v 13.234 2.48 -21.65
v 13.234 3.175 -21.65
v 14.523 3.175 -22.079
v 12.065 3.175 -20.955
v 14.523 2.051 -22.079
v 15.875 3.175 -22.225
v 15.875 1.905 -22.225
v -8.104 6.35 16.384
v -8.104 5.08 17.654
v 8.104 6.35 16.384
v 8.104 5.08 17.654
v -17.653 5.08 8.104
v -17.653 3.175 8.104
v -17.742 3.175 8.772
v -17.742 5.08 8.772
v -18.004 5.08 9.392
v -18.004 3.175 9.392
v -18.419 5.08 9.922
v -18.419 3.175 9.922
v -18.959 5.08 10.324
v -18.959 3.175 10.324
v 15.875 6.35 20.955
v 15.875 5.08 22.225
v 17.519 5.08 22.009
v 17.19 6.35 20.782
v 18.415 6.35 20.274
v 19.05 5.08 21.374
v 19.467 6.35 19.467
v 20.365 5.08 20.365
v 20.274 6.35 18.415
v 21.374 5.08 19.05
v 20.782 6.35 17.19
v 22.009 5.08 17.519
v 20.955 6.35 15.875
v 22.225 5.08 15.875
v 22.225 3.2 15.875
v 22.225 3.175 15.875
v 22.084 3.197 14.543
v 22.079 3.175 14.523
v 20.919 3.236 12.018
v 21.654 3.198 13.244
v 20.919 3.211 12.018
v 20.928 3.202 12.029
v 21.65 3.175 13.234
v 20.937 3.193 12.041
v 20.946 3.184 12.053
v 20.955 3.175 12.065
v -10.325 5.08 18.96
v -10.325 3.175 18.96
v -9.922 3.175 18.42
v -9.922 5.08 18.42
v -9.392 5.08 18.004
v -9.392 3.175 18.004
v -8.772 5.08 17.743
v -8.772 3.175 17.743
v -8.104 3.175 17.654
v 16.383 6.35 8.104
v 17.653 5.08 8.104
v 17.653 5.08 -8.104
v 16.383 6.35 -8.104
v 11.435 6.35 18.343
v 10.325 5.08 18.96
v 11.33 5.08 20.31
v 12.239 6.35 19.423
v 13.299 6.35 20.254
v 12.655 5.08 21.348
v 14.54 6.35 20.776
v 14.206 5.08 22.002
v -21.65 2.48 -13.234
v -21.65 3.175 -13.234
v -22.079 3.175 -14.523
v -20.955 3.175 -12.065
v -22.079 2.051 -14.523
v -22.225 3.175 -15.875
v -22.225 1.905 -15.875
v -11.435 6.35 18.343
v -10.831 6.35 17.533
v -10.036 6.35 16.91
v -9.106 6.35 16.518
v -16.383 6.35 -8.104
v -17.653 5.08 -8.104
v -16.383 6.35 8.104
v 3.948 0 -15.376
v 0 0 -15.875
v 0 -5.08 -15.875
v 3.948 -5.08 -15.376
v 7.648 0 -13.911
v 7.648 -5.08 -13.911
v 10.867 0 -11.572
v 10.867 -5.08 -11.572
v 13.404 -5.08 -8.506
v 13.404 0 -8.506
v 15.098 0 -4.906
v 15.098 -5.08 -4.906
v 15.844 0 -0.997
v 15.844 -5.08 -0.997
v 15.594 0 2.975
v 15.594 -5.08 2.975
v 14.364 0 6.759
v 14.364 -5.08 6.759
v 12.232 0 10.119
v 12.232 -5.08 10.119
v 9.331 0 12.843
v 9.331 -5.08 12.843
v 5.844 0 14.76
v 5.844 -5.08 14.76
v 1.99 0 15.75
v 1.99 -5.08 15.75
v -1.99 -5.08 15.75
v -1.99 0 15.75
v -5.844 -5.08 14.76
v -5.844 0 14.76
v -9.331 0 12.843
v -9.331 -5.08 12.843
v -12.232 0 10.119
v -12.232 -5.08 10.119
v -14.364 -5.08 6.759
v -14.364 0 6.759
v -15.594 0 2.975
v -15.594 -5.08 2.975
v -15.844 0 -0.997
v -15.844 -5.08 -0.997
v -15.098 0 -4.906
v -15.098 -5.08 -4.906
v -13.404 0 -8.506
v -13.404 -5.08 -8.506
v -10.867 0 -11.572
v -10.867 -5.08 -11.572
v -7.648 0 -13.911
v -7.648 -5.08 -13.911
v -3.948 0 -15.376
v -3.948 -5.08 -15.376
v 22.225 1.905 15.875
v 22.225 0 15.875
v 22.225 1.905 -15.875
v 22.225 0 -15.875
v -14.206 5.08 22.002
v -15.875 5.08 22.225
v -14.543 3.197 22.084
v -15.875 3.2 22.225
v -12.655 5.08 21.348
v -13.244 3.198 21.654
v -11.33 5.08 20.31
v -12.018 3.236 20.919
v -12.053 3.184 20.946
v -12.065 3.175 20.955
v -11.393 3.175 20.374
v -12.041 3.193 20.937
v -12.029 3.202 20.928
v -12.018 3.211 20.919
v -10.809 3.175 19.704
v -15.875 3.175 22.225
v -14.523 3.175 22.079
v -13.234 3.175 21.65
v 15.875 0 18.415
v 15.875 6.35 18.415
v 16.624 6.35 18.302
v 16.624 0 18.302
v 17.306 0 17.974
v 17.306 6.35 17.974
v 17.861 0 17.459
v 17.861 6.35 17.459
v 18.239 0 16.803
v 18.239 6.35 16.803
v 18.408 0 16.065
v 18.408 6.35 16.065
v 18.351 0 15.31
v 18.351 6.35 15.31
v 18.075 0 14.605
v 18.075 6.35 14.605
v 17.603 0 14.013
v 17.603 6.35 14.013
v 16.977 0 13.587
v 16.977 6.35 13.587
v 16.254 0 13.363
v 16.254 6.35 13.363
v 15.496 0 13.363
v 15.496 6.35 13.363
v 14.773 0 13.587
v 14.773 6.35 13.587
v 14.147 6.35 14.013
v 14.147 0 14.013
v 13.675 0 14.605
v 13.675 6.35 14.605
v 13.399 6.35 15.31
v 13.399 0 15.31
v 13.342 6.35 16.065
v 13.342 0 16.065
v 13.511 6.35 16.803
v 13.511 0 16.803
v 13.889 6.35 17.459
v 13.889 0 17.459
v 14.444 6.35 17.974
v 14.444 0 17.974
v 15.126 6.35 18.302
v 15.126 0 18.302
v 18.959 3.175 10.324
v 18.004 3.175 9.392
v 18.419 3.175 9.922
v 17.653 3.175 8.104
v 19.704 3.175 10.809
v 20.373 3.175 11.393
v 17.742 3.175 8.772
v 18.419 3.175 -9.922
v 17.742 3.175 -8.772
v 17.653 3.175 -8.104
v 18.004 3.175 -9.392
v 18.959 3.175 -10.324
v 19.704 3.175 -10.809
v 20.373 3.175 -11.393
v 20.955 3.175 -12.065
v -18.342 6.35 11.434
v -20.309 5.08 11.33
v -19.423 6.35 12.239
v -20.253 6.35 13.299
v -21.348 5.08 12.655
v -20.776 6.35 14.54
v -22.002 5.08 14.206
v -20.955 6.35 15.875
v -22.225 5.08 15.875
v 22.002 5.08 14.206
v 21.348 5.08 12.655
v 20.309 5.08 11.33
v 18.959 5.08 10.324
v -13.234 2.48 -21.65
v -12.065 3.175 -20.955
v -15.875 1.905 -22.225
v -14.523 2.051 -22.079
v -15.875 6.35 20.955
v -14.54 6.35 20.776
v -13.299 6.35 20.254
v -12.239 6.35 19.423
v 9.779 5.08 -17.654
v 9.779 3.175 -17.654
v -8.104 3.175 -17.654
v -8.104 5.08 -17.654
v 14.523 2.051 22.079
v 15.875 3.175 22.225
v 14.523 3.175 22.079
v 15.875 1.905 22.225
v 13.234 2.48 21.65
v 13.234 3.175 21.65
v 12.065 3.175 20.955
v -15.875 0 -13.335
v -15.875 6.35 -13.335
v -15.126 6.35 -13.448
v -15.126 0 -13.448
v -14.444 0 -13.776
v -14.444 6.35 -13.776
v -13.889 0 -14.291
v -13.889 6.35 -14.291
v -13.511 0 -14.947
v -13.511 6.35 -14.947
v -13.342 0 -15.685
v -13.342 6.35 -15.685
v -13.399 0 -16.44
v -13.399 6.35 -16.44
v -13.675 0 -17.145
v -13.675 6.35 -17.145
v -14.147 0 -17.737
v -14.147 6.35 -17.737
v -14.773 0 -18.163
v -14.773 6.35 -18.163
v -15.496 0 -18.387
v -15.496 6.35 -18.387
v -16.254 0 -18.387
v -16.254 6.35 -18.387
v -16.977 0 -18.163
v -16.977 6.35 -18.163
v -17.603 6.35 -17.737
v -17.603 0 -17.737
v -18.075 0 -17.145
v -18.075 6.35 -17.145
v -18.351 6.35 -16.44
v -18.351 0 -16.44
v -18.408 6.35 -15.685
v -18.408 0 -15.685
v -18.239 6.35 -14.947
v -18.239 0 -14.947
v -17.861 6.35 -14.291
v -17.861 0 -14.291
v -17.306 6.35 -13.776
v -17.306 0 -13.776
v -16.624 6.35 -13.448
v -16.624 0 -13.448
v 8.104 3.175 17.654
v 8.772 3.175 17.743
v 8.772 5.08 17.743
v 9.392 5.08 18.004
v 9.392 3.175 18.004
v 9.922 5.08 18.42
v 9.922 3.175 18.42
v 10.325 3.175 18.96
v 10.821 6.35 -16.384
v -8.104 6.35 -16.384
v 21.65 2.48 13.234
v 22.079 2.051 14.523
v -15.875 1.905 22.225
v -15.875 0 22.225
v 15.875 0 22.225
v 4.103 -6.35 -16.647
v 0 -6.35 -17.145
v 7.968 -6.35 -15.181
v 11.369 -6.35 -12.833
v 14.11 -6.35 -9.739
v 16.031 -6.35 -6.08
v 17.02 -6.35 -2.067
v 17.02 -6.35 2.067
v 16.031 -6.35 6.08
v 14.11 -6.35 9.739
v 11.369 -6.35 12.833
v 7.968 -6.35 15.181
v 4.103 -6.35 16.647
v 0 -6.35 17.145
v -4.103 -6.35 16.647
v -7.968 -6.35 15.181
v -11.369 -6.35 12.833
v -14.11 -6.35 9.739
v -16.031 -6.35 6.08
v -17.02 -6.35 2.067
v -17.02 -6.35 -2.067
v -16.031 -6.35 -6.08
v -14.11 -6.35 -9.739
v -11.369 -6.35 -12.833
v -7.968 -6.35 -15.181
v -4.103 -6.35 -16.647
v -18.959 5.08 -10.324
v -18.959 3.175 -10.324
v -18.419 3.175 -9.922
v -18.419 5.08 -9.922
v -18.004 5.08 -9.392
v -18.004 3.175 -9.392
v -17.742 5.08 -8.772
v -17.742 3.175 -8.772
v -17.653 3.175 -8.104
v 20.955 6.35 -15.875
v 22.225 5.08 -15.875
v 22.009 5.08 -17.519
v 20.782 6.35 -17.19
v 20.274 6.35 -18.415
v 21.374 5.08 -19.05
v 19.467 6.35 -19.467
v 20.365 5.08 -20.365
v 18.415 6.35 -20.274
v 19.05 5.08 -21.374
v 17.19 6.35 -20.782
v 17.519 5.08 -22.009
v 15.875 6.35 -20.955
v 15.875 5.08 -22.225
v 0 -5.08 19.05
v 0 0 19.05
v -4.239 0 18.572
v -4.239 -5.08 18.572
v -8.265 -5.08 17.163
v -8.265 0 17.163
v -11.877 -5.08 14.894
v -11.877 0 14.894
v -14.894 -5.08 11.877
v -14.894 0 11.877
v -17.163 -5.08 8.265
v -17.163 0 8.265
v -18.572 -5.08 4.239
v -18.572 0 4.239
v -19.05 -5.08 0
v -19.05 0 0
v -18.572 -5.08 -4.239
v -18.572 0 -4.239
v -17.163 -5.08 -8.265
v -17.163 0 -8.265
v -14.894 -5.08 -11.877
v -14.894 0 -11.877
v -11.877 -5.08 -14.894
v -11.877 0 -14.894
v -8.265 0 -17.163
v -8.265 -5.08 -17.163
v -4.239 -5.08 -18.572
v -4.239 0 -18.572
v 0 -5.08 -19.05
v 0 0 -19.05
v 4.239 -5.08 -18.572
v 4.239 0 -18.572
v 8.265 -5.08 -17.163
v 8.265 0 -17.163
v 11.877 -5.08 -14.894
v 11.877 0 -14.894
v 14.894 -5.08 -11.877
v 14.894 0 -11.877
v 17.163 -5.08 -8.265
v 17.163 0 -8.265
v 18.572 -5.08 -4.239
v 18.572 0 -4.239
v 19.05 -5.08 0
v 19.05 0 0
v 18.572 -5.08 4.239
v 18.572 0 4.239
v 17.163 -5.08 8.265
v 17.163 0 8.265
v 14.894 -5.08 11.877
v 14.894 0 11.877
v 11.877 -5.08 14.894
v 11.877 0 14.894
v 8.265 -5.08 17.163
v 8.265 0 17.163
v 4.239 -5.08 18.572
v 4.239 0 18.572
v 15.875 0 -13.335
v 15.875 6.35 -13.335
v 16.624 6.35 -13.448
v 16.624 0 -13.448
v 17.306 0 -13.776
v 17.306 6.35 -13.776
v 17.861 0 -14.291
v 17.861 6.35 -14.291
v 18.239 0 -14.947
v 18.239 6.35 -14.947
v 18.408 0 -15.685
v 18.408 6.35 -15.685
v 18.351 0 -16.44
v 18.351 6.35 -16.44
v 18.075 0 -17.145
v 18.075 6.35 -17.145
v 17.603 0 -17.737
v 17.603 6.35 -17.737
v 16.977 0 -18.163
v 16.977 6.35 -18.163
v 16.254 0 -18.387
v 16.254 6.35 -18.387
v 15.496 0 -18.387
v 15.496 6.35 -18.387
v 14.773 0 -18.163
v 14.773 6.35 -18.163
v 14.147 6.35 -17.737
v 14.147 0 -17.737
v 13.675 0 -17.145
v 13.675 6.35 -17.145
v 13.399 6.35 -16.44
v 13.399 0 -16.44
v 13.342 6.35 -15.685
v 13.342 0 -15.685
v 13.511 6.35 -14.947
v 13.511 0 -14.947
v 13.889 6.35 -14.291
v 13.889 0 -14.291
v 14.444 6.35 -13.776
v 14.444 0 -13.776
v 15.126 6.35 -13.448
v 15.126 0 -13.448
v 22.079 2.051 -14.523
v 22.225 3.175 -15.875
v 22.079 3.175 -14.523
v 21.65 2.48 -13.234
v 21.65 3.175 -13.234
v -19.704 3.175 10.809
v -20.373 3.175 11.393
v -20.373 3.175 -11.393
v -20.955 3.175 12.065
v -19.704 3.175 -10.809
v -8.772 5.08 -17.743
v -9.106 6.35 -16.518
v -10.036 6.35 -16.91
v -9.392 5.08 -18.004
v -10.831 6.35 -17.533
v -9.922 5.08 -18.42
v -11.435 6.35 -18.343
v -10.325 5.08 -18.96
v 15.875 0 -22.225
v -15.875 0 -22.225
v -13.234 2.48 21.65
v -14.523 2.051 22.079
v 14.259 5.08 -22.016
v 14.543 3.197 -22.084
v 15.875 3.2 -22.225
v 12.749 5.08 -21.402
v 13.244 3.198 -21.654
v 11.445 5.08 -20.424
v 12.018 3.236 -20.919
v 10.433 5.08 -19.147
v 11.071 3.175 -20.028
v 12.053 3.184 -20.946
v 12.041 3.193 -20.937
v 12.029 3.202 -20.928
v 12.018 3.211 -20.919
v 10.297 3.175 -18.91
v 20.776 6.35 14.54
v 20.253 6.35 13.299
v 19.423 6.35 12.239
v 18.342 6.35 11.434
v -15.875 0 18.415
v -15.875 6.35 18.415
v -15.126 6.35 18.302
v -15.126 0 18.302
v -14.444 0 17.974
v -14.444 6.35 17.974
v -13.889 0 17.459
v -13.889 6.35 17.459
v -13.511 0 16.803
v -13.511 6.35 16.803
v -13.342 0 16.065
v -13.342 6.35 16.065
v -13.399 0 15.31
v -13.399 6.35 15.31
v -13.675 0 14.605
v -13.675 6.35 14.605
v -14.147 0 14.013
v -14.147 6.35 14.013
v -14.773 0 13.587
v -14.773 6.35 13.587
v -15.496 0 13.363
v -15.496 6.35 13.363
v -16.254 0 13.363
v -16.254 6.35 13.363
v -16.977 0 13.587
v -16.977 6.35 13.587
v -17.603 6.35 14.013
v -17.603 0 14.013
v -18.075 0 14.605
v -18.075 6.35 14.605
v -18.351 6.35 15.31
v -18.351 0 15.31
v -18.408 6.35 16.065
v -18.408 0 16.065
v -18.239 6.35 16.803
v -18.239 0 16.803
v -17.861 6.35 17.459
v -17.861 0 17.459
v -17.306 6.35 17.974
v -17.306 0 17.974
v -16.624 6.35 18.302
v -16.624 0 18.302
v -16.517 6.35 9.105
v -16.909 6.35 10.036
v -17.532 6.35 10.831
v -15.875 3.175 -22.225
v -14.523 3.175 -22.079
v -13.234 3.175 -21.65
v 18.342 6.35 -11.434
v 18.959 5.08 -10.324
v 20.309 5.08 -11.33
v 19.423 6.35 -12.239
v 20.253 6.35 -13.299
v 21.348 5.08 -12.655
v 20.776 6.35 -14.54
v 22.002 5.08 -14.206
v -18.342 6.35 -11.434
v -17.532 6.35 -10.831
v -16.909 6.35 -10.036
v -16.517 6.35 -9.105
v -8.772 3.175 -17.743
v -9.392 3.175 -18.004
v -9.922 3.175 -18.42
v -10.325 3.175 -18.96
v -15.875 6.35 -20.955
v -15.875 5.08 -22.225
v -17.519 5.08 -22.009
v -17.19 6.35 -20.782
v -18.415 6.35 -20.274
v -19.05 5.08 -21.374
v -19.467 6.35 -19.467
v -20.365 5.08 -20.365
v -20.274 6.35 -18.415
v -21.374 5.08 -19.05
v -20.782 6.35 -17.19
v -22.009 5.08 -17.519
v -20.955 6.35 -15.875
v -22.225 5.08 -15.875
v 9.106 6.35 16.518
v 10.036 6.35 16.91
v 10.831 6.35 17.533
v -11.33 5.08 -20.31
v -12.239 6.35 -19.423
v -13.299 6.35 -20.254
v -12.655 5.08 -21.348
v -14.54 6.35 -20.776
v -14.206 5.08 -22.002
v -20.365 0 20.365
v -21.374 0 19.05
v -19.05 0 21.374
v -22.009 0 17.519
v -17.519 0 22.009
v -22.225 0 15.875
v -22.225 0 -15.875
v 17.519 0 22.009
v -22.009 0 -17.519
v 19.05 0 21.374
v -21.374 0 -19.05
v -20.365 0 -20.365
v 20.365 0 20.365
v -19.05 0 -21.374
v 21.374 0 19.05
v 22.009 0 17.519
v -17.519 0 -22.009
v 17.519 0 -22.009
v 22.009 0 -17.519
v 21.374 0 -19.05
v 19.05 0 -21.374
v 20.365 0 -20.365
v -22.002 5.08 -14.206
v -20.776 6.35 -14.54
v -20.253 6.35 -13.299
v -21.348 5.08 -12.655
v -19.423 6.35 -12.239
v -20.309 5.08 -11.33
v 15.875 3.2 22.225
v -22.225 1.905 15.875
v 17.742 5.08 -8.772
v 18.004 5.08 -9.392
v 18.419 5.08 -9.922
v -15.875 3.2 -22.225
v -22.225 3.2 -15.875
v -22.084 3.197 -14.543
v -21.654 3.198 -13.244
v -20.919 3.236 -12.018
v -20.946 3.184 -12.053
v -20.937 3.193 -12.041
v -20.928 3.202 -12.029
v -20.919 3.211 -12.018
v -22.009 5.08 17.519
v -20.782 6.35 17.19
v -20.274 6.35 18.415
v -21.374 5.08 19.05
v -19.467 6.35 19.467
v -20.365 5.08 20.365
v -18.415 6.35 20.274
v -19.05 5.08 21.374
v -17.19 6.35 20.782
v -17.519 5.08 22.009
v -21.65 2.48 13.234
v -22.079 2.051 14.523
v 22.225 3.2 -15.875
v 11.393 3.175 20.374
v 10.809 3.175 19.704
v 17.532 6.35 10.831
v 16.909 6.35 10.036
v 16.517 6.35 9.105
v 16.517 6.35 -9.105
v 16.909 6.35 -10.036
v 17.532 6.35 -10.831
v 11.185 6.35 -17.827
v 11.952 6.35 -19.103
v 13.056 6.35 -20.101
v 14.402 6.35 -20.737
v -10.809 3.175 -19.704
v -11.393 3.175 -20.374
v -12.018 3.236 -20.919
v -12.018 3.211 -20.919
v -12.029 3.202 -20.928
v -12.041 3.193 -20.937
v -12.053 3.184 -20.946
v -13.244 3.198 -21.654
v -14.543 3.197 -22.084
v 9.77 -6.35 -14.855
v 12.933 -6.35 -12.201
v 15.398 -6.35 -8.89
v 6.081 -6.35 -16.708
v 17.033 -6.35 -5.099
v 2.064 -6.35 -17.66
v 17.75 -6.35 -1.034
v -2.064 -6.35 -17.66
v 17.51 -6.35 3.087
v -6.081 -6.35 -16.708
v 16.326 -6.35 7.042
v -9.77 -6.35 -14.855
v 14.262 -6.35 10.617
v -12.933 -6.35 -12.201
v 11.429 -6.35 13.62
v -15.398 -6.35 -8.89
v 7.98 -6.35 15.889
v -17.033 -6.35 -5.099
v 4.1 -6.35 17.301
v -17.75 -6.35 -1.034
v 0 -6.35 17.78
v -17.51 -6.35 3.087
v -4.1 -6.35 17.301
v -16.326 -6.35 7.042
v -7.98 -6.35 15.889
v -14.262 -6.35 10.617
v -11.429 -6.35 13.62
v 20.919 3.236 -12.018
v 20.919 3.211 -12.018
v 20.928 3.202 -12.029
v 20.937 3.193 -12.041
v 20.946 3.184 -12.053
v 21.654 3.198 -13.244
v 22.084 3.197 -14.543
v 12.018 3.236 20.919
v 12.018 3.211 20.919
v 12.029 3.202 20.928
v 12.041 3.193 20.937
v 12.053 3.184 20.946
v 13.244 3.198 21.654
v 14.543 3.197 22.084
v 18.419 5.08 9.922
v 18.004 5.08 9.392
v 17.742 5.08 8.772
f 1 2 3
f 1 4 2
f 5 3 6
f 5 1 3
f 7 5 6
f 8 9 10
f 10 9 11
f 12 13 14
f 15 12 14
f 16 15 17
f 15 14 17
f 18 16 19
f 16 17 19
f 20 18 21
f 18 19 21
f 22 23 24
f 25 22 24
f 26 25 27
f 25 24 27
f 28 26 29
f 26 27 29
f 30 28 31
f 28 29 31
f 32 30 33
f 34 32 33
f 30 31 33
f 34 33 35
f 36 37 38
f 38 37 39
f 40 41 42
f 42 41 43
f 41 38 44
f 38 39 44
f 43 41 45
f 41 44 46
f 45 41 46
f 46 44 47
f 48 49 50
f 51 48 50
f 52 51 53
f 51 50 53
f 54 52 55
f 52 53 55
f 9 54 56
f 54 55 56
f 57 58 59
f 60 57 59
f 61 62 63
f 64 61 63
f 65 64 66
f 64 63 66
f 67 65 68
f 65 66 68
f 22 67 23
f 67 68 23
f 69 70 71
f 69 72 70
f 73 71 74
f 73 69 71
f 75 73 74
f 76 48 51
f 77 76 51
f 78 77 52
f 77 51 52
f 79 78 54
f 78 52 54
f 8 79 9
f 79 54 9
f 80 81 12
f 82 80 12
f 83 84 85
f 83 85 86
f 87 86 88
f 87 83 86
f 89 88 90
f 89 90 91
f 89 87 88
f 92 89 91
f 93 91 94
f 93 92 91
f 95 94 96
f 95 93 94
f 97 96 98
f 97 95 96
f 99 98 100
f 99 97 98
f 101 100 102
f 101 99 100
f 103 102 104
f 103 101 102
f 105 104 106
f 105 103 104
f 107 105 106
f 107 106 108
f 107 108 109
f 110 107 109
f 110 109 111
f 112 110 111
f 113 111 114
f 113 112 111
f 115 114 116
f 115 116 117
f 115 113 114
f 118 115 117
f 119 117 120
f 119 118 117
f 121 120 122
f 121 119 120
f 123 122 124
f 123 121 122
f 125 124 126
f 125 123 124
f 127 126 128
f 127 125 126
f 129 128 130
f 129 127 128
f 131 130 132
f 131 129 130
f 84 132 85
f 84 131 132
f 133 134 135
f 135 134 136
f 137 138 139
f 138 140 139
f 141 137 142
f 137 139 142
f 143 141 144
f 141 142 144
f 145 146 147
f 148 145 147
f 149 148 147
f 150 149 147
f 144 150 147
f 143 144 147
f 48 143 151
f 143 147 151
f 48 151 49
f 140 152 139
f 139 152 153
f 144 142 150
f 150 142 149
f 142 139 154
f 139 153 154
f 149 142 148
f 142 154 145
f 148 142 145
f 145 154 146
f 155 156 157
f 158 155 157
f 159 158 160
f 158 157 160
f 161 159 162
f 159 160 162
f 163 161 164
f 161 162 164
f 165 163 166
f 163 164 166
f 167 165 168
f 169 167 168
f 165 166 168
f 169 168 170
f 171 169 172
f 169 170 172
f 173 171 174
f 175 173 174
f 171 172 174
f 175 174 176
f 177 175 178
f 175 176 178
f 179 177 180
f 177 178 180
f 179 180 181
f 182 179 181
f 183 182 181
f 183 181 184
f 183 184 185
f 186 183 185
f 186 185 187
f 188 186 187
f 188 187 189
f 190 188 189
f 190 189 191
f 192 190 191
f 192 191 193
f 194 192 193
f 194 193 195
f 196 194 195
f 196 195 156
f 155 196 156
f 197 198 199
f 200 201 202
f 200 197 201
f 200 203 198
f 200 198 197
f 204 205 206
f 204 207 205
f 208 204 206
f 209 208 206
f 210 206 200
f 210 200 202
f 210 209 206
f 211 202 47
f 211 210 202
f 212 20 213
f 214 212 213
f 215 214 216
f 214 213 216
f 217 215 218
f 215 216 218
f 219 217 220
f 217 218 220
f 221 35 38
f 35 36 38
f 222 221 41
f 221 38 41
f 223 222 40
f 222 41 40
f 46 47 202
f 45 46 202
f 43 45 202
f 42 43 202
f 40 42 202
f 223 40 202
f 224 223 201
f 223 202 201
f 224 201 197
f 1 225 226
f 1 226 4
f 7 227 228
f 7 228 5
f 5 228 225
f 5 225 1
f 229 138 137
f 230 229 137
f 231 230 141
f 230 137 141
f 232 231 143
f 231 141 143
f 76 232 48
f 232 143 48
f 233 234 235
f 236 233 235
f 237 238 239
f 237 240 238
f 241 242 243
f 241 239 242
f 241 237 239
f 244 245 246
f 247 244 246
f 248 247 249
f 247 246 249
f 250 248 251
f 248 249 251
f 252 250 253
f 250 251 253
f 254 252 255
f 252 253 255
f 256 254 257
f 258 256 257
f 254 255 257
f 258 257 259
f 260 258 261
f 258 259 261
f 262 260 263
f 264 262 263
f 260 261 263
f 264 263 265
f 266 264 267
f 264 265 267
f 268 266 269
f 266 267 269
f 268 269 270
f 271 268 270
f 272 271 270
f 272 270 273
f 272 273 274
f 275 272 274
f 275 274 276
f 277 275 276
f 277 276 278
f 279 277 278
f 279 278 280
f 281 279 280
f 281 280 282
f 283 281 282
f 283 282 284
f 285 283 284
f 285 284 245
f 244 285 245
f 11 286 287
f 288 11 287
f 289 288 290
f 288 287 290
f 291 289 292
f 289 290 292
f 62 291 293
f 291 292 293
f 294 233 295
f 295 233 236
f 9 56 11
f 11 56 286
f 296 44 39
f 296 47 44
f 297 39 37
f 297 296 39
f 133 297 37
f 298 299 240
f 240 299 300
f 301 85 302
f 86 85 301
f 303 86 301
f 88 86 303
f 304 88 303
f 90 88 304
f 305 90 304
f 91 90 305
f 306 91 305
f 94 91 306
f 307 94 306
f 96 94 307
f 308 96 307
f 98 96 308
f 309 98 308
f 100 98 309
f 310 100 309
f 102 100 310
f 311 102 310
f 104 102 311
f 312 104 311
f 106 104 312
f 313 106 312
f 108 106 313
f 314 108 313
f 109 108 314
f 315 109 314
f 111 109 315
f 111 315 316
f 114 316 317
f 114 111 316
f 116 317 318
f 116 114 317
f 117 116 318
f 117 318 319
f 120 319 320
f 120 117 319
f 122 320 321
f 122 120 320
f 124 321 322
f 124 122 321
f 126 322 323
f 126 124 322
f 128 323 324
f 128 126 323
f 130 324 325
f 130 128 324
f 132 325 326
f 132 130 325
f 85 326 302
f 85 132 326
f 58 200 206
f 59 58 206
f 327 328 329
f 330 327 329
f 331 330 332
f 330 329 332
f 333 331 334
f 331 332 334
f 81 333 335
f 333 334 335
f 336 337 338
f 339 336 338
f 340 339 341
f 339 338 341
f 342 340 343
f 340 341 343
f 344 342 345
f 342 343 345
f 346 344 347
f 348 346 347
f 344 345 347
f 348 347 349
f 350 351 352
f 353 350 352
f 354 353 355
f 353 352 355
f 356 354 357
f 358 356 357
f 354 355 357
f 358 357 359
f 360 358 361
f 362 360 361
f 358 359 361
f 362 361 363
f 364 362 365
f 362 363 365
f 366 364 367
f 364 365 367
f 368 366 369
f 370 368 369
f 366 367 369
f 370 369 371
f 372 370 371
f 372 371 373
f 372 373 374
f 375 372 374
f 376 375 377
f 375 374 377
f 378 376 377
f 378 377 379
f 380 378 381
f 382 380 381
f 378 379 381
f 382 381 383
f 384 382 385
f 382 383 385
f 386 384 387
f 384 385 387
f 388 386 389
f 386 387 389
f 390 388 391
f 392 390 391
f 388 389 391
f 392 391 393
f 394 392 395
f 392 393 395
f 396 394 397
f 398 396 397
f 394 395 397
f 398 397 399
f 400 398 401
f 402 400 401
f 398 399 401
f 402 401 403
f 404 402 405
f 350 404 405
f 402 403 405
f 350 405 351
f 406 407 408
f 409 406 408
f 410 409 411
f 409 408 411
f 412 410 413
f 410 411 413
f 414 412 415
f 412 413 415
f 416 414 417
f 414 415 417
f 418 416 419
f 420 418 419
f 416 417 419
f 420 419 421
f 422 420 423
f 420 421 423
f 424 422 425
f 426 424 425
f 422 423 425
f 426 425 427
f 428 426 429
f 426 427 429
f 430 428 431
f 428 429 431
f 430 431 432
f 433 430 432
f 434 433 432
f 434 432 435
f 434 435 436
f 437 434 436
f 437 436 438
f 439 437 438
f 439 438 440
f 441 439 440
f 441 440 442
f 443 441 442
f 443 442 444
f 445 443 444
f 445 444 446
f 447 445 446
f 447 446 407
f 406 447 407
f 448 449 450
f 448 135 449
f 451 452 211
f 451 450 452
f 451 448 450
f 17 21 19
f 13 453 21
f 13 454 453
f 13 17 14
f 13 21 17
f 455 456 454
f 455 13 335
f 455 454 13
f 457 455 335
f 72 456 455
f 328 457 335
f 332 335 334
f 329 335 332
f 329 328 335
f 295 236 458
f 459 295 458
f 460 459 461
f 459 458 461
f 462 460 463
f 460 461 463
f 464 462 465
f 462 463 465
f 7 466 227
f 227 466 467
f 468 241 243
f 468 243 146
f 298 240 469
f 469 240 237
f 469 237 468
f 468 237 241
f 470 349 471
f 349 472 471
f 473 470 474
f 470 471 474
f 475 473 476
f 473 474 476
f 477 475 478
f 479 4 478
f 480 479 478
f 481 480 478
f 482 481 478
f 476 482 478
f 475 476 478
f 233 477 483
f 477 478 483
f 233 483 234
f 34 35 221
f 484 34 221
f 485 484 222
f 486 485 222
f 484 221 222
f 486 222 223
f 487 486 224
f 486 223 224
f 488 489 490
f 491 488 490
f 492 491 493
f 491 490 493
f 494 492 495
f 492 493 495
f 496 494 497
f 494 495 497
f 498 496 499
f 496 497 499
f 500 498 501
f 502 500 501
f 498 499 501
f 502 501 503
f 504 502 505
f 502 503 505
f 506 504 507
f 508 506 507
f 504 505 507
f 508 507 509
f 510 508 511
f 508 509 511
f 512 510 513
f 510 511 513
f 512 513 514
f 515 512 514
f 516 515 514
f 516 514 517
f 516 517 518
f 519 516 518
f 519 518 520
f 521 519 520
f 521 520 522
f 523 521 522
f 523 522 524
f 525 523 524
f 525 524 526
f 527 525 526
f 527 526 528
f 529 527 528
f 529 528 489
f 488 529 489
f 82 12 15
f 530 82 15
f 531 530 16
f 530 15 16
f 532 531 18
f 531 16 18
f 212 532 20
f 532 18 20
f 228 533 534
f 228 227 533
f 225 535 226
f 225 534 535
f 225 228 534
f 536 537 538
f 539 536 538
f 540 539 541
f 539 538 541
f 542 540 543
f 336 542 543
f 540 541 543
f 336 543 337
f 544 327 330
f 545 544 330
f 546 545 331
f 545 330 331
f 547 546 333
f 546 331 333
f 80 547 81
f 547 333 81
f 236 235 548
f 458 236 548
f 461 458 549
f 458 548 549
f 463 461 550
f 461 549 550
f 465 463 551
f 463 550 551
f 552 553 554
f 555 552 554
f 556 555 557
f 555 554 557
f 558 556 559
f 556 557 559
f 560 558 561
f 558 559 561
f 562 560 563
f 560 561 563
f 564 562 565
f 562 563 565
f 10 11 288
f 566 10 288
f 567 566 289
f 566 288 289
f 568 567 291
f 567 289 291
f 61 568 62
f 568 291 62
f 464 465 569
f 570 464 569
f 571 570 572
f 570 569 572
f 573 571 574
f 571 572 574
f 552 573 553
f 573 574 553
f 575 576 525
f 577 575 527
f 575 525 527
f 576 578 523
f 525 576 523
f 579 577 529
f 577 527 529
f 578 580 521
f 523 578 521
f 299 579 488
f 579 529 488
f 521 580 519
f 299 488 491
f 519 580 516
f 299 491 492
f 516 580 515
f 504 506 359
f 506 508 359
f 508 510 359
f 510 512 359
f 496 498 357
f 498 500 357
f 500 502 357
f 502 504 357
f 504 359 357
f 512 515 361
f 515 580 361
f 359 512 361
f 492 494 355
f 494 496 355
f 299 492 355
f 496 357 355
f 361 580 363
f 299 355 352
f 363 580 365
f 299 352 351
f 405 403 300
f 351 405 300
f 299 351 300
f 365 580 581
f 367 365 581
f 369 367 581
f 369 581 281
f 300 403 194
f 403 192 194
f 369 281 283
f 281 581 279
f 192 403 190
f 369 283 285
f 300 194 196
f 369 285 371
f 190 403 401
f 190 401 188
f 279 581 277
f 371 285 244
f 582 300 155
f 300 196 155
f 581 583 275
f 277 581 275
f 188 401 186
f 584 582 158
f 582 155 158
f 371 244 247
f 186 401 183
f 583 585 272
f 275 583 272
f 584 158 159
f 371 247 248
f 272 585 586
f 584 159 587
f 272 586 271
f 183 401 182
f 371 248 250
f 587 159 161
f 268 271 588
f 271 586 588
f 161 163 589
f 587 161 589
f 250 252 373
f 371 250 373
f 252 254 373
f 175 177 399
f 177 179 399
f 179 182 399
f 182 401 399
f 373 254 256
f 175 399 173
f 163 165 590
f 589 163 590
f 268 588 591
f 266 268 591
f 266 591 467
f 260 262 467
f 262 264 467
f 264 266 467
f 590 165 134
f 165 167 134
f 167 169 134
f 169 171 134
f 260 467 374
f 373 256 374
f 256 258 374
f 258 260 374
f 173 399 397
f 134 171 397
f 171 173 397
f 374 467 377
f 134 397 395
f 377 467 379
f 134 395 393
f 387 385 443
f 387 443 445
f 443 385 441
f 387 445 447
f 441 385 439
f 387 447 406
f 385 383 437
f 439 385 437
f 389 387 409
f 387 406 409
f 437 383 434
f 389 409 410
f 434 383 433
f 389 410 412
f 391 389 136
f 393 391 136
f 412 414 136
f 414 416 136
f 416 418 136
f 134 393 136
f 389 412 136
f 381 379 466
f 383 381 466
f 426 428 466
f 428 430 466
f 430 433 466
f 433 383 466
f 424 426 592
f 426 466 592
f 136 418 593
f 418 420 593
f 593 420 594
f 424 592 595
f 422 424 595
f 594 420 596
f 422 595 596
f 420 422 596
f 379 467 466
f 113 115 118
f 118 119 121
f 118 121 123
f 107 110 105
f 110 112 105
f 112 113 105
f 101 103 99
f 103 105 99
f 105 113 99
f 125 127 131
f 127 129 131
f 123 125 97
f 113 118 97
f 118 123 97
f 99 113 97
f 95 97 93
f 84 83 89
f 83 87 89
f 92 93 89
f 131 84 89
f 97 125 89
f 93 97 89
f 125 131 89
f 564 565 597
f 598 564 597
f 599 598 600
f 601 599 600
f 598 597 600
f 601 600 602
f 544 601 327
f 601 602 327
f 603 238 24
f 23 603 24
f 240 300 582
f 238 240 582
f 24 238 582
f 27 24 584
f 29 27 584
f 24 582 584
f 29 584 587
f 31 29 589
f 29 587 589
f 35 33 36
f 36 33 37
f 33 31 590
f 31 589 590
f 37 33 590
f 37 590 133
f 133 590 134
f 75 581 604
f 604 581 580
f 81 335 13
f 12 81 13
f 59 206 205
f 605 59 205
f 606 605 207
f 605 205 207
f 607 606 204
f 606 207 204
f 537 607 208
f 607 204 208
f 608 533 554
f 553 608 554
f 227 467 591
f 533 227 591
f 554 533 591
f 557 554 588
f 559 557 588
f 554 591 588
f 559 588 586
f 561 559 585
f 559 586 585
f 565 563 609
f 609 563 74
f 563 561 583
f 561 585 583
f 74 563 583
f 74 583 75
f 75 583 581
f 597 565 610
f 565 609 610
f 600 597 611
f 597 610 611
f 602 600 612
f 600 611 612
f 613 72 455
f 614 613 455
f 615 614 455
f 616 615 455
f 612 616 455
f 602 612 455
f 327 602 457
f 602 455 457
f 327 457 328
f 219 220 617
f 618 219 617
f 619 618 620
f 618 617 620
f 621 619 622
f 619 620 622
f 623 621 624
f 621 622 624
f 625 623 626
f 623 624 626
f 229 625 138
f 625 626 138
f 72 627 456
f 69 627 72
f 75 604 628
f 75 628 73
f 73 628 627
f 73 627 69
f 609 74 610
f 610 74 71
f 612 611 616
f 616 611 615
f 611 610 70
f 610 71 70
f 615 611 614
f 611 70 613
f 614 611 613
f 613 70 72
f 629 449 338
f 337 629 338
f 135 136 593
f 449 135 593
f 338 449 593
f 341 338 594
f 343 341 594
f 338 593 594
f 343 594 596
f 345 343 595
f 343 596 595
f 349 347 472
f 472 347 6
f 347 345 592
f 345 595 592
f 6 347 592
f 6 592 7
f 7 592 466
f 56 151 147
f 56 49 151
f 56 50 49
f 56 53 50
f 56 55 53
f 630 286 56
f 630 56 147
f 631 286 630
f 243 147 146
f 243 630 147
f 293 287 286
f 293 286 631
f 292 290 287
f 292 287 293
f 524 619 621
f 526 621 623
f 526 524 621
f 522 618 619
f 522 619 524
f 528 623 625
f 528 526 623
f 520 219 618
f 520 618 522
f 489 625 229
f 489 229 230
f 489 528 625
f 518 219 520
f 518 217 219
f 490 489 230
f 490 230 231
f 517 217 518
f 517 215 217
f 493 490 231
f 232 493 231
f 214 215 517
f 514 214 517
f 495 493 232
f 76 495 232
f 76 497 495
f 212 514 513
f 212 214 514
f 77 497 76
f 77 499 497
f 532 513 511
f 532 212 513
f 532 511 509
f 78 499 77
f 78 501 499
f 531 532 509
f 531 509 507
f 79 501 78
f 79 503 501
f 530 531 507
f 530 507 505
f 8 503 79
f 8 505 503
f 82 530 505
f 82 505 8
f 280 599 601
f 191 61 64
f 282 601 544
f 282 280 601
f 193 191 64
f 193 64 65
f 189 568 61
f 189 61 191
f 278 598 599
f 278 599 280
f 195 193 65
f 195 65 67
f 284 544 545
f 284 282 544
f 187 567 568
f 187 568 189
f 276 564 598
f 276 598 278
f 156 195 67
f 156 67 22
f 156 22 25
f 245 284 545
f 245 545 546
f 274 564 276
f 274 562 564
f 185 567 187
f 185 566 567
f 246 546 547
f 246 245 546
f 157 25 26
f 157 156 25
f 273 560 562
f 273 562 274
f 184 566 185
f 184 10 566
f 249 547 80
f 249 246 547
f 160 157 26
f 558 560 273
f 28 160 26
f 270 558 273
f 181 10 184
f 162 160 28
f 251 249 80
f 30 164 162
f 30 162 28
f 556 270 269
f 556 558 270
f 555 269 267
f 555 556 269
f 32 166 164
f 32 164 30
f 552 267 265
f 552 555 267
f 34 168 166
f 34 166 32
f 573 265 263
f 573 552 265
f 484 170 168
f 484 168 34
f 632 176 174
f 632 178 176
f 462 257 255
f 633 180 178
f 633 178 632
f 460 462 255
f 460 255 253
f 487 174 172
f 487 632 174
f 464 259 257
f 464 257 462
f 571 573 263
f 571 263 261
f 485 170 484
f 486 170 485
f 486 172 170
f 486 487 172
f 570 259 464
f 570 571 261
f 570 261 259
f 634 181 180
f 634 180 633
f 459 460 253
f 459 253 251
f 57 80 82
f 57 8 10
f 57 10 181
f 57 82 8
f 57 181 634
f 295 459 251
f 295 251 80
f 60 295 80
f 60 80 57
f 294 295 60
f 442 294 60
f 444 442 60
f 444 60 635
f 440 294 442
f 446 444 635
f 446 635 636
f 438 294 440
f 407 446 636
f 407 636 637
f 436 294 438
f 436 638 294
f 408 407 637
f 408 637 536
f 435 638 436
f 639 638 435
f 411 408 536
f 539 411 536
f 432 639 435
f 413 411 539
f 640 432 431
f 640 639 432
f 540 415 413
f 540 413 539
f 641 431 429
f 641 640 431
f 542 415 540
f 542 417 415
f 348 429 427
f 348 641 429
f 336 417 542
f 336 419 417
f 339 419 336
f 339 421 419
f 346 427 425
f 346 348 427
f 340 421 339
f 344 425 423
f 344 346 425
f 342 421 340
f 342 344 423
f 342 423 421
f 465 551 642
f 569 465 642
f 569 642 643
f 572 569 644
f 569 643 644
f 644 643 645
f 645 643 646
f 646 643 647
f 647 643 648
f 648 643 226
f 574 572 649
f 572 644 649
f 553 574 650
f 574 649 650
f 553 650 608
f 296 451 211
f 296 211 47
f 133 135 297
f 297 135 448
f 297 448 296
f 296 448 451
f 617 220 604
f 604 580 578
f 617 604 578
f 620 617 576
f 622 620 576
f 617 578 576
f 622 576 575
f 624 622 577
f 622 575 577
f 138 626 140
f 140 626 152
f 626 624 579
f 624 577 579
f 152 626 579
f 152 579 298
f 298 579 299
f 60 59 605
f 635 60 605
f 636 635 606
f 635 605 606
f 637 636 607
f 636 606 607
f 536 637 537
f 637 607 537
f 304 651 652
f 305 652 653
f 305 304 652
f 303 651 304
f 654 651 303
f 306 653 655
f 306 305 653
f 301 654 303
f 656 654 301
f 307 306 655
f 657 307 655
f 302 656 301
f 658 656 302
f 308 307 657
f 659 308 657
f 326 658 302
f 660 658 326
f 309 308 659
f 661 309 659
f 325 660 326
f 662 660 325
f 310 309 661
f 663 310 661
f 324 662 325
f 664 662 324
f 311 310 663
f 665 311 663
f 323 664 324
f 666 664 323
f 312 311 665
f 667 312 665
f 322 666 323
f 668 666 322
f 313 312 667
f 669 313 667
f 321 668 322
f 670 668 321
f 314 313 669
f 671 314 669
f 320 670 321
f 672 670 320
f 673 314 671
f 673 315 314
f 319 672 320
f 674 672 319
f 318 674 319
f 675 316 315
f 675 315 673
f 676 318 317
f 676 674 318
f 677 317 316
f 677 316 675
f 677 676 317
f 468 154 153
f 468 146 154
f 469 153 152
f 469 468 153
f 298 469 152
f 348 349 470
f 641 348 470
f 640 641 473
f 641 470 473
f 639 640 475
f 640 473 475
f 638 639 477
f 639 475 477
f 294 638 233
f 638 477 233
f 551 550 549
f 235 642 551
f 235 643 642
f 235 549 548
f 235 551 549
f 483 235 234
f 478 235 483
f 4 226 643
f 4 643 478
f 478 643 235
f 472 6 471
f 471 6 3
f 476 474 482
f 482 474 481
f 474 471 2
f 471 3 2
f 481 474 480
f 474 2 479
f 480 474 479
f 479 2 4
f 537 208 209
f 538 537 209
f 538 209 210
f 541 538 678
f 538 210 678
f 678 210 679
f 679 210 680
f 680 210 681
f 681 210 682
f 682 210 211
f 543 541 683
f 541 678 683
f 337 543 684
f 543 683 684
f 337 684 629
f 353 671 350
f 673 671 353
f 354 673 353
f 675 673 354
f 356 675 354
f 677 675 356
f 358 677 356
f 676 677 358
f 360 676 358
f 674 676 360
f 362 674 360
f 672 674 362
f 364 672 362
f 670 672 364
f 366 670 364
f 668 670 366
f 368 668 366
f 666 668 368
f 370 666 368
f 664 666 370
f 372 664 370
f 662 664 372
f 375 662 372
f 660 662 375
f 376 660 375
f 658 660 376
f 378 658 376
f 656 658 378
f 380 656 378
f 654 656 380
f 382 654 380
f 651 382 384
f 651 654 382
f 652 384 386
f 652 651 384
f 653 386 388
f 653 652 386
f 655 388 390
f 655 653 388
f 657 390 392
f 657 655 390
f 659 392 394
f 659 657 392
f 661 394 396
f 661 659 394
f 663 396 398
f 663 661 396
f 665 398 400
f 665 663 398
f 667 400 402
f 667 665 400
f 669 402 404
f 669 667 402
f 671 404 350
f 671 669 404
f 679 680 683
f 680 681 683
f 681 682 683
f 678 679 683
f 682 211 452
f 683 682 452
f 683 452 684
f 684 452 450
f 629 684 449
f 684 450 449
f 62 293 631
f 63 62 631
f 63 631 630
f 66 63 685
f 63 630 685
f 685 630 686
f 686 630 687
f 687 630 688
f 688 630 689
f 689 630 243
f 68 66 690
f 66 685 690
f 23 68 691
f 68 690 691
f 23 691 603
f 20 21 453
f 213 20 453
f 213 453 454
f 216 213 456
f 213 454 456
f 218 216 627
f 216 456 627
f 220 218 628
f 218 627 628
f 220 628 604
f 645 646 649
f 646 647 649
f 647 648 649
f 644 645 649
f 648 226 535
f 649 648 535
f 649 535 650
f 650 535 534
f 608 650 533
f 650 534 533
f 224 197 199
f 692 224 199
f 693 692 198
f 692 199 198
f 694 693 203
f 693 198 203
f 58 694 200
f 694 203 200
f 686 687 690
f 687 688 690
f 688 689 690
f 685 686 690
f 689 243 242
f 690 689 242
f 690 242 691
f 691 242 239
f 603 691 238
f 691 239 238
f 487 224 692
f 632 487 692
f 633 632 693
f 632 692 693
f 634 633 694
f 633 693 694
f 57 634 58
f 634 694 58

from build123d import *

# Parameters (mm, degrees)
BOSS_EXTRUDE1_DEPTH = 3.175
BOSS_EXTRUDE2_DEPTH = 3.175
SKETCH3_R           = 19.05
SKETCH3_R_2         = 15.875
BOSS_EXTRUDE3_DEPTH = 6.35
SKETCH4_R           = 2.54
CUT_EXTRUDE1_DEPTH  = 34.89972345
CHAMFER1_SIZE       = 1.27


with BuildPart() as part:
    # Sketch1 → Boss-Extrude1 (new body)
    with BuildSketch(Plane(origin=(0, 0, 0), x_dir=(1, 0, 0), z_dir=(0, 1, 0))):
        with BuildLine():
            Line((-15.875, -22.225), (15.875, -22.225))
            ThreePointArc((15.875, -22.225), (20.365128061, -20.365128061), (22.225, -15.875))
            Line((22.225, -15.875), (22.225, 15.875))
            ThreePointArc((22.225, 15.875), (20.365128061, 20.365128061), (15.875, 22.225))
            Line((15.875, 22.225), (-15.875, 22.225))
            ThreePointArc((-15.875, 22.225), (-20.365128061, 20.365128061), (-22.225, 15.875))
            Line((-22.225, 15.875), (-22.225, -15.875))
            ThreePointArc((-22.225, -15.875), (-20.365128061, -20.365128061), (-15.875, -22.225))
        make_face()
    extrude(amount=BOSS_EXTRUDE1_DEPTH)

    # Sketch2 → Boss-Extrude2 (add)
    with BuildSketch(Plane(origin=(0, 3.175, 0), x_dir=(1, 0, 0), z_dir=(0, 1, 0))):
        with BuildLine():
            Line((9.779188038, 17.653644576), (-8.104452463, 17.653644576))
            ThreePointArc((-8.104452463, 17.653644576), (-9.392376749, 18.004386475), (-10.324608902, 18.959746126))
            ThreePointArc((-10.324608902, 18.959746126), (-12.655189283, 21.348145252), (-15.875, 22.225))
            ThreePointArc((-15.875, 22.225), (-20.365128061, 20.365128061), (-22.225, 15.875))
            ThreePointArc((-22.225, 15.875), (-21.348011707, 12.654962289), (-18.959285714, 10.324353044))
            ThreePointArc((-18.959285714, 10.324353044), (-18.003795317, 9.392109345), (-17.653, 8.104094261))
            Line((-17.653, 8.104094261), (-17.653, -8.104094261))
            ThreePointArc((-17.653, -8.104094261), (-18.003795317, -9.392109345), (-18.959285714, -10.324353044))
            ThreePointArc((-18.959285714, -10.324353044), (-21.348011707, -12.654962289), (-22.225, -15.875))
            ThreePointArc((-22.225, -15.875), (-20.365128061, -20.365128061), (-15.875, -22.225))
            ThreePointArc((-15.875, -22.225), (-12.655189283, -21.348145252), (-10.324608902, -18.959746126))
            ThreePointArc((-10.324608902, -18.959746126), (-9.392376749, -18.004386475), (-8.104452463, -17.653644576))
            Line((-8.104452463, -17.653644576), (8.104452463, -17.653644576))
            ThreePointArc((8.104452463, -17.653644576), (9.392376749, -18.004386475), (10.324608902, -18.959746126))
            ThreePointArc((10.324608902, -18.959746126), (12.655189283, -21.348145252), (15.875, -22.225))
            ThreePointArc((15.875, -22.225), (20.365128061, -20.365128061), (22.225, -15.875))
            ThreePointArc((22.225, -15.875), (21.348011707, -12.654962289), (18.959285714, -10.324353044))
            ThreePointArc((18.959285714, -10.324353044), (18.003795317, -9.392109345), (17.653, -8.104094261))
            Line((17.653, -8.104094261), (17.653, 8.104094261))
            ThreePointArc((17.653, 8.104094261), (18.003795317, 9.392109345), (18.959285714, 10.324353044))
            ThreePointArc((18.959285714, 10.324353044), (21.348011707, 12.654962289), (22.225, 15.875))
            ThreePointArc((22.225, 15.875), (20.365128061, 20.365128061), (15.875, 22.225))
            ThreePointArc((15.875, 22.225), (12.065268583, 20.955201426), (9.779188038, 17.653644576))
        make_face()
    extrude(amount=BOSS_EXTRUDE2_DEPTH)

    # Sketch3 → Boss-Extrude3 (add)
    with BuildSketch(Plane.XZ):
        with Locations(Location((0, 0, 0), (0, 0, 90))):
            Circle(SKETCH3_R)
        with Locations(Location((0, 0, 0), (0, 0, 270))):
            Circle(SKETCH3_R_2, mode=Mode.SUBTRACT)
    extrude(amount=BOSS_EXTRUDE3_DEPTH)

    # Sketch4 → Cut-Extrude1 (cut, through all)
    with BuildSketch(Plane(origin=(0, 6.35, 0), x_dir=(1, 0, 0), z_dir=(0, 1, 0))):
        with Locations(Location((-15.875, 15.875, 0), (0, 0, 270))):
            Circle(SKETCH4_R)
        with Locations(Location((15.875, 15.875, 0), (0, 0, 270))):
            Circle(SKETCH4_R)
        with Locations(Location((-15.875, -15.875, 0), (0, 0, 270))):
            Circle(SKETCH4_R)
        with Locations(Location((15.875, -15.875, 0), (0, 0, 270))):
            Circle(SKETCH4_R)
    extrude(amount=-CUT_EXTRUDE1_DEPTH, mode=Mode.SUBTRACT)

    # Chamfer1
    chamfer1_edges = [part.edges().sort_by_distance(p)[0] for p in [
        (-20.365314283, 6.35, -20.36494183),
        (-20.365314283, 6.35, 20.36494183),
        (-9.392376749, 6.35, -18.004386475),
        (19.836937806, 6.35, -20.837413609),
        (0.837367788, 6.35, -17.653644576),
        (18.003795317, 6.35, -9.392109345),
        (17.653, 6.35, 0),
        (18.003795317, 6.35, 9.392109345),
        (-18.003795317, 6.35, -9.392109345),
        (20.365314283, 6.35, 20.36494183),
        (-17.653, 6.35, 0),
        (9.392376749, 6.35, 18.004386475),
        (-18.003795317, 6.35, 9.392109345),
        (0, 6.35, 17.653644576),
        (-9.392376749, 6.35, 18.004386475),
    ]]
    chamfer(chamfer1_edges, length=CHAMFER1_SIZE)
    chamfer1_2_edges = [part.edges().sort_by_distance(p)[0] for p in [
        (0, -6.35, -19.05),
    ]]
    chamfer(chamfer1_2_edges, length=CHAMFER1_SIZE)
    chamfer1_3_edges = [part.edges().sort_by_distance(p)[0] for p in [
        (0, -6.35, 15.875),
    ]]
    chamfer(chamfer1_3_edges, length=CHAMFER1_SIZE)
    # the kernel refuses this chamfer: 1.27 mm, written as the material it takes off along each edge
    with BuildSketch(Plane(origin=(-22.225, 3.175, -19.141037395), x_dir=(-0.02749587661058728, -0.9996219169112966, 0), z_dir=(0, 0, 1))) as chamfer1_4_piece_1_section:
        with BuildLine():
            Line((1.306414958, 0), (-0.071814887, 1.304439598))
            Line((-0.071814887, 1.304439598), (-0.097205283, 1.303741203))
            ThreePointArc((-0.097205283, 1.303741203), (-0.043344118, 0.652015244), (-0.025390397, -0.000698395))
            Line((-0.025390397, -0.000698395), (0.000698395, -0.025390397))
            ThreePointArc((0.000698395, -0.025390397), (0.653412034, -0.007436675), (1.307113353, -0.025390397))
            Line((1.307113353, -0.025390397), (1.306414958, 0))
        make_face()
    chamfer1_4_piece_1 = extrude(amount=38.282074789, mode=Mode.PRIVATE)
    chamfer1_4_piece_1 = chamfer1_4_piece_1 - Plane(origin=(-15.875, 2.735416382, -15.875), x_dir=(0, 0, -1), z_dir=(0, -1, 0)) * Cylinder(6.35, 82, mode=Mode.PRIVATE)
    chamfer1_4_piece_1 = chamfer1_4_piece_1 - Plane(origin=(-15.875, 2.735416382, 15.875), x_dir=(-1, 0, 0), z_dir=(0, -1, 0)) * Cylinder(6.35, 82, mode=Mode.PRIVATE)
    add(chamfer1_4_piece_1, mode=Mode.SUBTRACT)
    # the kernel refuses this chamfer: 1.27 mm, written as the material it takes off along each edge
    with BuildSketch(Plane(origin=(19.141037395, 3.175, -22.225), x_dir=(0, -0.9996219169112966, -0.02749587661058728), z_dir=(-1, 0, 0))) as chamfer1_5_piece_1_section:
        with BuildLine():
            Line((1.306414958, 0), (-0.071814887, 1.304439598))
            Line((-0.071814887, 1.304439598), (-0.097205283, 1.303741203))
            ThreePointArc((-0.097205283, 1.303741203), (-0.043344118, 0.652015244), (-0.025390397, -0.000698395))
            Line((-0.025390397, -0.000698395), (0.000698395, -0.025390397))
            ThreePointArc((0.000698395, -0.025390397), (0.653412034, -0.007436675), (1.307113353, -0.025390397))
            Line((1.307113353, -0.025390397), (1.306414958, 0))
        make_face()
    chamfer1_5_piece_1 = extrude(amount=38.282074789, mode=Mode.PRIVATE)
    chamfer1_5_piece_1 = chamfer1_5_piece_1 - Plane(origin=(-15.875, 2.735416382, -15.875), x_dir=(0, 0, -1), z_dir=(0, -1, 0)) * Cylinder(6.35, 82, mode=Mode.PRIVATE)
    chamfer1_5_piece_1 = chamfer1_5_piece_1 - Plane(origin=(15.875, 2.735416382, -15.875), x_dir=(1, 0, 0), z_dir=(0, -1, 0)) * Cylinder(6.35, 82, mode=Mode.PRIVATE)
    add(chamfer1_5_piece_1, mode=Mode.SUBTRACT)
    # the kernel refuses this chamfer: 1.27 mm, written as the material it takes off along each edge
    with BuildSketch(Plane(origin=(-19.141037395, 3.175, 22.225), x_dir=(0, -0.9996219169112966, 0.02749587661058728), z_dir=(1, 0, 0))) as chamfer1_6_piece_1_section:
        with BuildLine():
            Line((1.306414958, 0), (-0.071814887, 1.304439598))
            Line((-0.071814887, 1.304439598), (-0.097205283, 1.303741203))
            ThreePointArc((-0.097205283, 1.303741203), (-0.043344118, 0.652015244), (-0.025390397, -0.000698395))
            Line((-0.025390397, -0.000698395), (0.000698395, -0.025390397))
            ThreePointArc((0.000698395, -0.025390397), (0.653412034, -0.007436675), (1.307113353, -0.025390397))
            Line((1.307113353, -0.025390397), (1.306414958, 0))
        make_face()
    chamfer1_6_piece_1 = extrude(amount=38.282074789, mode=Mode.PRIVATE)
    chamfer1_6_piece_1 = chamfer1_6_piece_1 - Plane(origin=(-15.875, 2.735416383, 15.875), x_dir=(-1, 0, 0), z_dir=(0, -1, 0)) * Cylinder(6.35, 82, mode=Mode.PRIVATE)
    chamfer1_6_piece_1 = chamfer1_6_piece_1 - Plane(origin=(15.875, 2.735416383, 15.875), x_dir=(0, 0, 1), z_dir=(0, -1, 0)) * Cylinder(6.35, 82, mode=Mode.PRIVATE)
    add(chamfer1_6_piece_1, mode=Mode.SUBTRACT)
    # the kernel refuses this chamfer: 1.27 mm, written as the material it takes off along each edge
    with BuildSketch(Plane(origin=(22.225, 3.175, 19.141037395), x_dir=(0.02749587661058728, -0.9996219169112966, 0), z_dir=(0, 0, -1))) as chamfer1_7_piece_1_section:
        with BuildLine():
            Line((1.306414958, 0), (-0.071814887, 1.304439598))
            Line((-0.071814887, 1.304439598), (-0.097205283, 1.303741203))
            ThreePointArc((-0.097205283, 1.303741203), (-0.043344118, 0.652015244), (-0.025390397, -0.000698395))
            Line((-0.025390397, -0.000698395), (0.000698395, -0.025390397))
            ThreePointArc((0.000698395, -0.025390397), (0.653412034, -0.007436675), (1.307113353, -0.025390397))
            Line((1.307113353, -0.025390397), (1.306414958, 0))
        make_face()
    chamfer1_7_piece_1 = extrude(amount=38.282074789, mode=Mode.PRIVATE)
    chamfer1_7_piece_1 = chamfer1_7_piece_1 - Plane(origin=(15.875, 2.735416383, -15.875), x_dir=(1, 0, 0), z_dir=(0, -1, 0)) * Cylinder(6.35, 82, mode=Mode.PRIVATE)
    chamfer1_7_piece_1 = chamfer1_7_piece_1 - Plane(origin=(15.875, 2.735416383, 15.875), x_dir=(0, 0, 1), z_dir=(0, -1, 0)) * Cylinder(6.35, 82, mode=Mode.PRIVATE)
    add(chamfer1_7_piece_1, mode=Mode.SUBTRACT)


solid = part.part
